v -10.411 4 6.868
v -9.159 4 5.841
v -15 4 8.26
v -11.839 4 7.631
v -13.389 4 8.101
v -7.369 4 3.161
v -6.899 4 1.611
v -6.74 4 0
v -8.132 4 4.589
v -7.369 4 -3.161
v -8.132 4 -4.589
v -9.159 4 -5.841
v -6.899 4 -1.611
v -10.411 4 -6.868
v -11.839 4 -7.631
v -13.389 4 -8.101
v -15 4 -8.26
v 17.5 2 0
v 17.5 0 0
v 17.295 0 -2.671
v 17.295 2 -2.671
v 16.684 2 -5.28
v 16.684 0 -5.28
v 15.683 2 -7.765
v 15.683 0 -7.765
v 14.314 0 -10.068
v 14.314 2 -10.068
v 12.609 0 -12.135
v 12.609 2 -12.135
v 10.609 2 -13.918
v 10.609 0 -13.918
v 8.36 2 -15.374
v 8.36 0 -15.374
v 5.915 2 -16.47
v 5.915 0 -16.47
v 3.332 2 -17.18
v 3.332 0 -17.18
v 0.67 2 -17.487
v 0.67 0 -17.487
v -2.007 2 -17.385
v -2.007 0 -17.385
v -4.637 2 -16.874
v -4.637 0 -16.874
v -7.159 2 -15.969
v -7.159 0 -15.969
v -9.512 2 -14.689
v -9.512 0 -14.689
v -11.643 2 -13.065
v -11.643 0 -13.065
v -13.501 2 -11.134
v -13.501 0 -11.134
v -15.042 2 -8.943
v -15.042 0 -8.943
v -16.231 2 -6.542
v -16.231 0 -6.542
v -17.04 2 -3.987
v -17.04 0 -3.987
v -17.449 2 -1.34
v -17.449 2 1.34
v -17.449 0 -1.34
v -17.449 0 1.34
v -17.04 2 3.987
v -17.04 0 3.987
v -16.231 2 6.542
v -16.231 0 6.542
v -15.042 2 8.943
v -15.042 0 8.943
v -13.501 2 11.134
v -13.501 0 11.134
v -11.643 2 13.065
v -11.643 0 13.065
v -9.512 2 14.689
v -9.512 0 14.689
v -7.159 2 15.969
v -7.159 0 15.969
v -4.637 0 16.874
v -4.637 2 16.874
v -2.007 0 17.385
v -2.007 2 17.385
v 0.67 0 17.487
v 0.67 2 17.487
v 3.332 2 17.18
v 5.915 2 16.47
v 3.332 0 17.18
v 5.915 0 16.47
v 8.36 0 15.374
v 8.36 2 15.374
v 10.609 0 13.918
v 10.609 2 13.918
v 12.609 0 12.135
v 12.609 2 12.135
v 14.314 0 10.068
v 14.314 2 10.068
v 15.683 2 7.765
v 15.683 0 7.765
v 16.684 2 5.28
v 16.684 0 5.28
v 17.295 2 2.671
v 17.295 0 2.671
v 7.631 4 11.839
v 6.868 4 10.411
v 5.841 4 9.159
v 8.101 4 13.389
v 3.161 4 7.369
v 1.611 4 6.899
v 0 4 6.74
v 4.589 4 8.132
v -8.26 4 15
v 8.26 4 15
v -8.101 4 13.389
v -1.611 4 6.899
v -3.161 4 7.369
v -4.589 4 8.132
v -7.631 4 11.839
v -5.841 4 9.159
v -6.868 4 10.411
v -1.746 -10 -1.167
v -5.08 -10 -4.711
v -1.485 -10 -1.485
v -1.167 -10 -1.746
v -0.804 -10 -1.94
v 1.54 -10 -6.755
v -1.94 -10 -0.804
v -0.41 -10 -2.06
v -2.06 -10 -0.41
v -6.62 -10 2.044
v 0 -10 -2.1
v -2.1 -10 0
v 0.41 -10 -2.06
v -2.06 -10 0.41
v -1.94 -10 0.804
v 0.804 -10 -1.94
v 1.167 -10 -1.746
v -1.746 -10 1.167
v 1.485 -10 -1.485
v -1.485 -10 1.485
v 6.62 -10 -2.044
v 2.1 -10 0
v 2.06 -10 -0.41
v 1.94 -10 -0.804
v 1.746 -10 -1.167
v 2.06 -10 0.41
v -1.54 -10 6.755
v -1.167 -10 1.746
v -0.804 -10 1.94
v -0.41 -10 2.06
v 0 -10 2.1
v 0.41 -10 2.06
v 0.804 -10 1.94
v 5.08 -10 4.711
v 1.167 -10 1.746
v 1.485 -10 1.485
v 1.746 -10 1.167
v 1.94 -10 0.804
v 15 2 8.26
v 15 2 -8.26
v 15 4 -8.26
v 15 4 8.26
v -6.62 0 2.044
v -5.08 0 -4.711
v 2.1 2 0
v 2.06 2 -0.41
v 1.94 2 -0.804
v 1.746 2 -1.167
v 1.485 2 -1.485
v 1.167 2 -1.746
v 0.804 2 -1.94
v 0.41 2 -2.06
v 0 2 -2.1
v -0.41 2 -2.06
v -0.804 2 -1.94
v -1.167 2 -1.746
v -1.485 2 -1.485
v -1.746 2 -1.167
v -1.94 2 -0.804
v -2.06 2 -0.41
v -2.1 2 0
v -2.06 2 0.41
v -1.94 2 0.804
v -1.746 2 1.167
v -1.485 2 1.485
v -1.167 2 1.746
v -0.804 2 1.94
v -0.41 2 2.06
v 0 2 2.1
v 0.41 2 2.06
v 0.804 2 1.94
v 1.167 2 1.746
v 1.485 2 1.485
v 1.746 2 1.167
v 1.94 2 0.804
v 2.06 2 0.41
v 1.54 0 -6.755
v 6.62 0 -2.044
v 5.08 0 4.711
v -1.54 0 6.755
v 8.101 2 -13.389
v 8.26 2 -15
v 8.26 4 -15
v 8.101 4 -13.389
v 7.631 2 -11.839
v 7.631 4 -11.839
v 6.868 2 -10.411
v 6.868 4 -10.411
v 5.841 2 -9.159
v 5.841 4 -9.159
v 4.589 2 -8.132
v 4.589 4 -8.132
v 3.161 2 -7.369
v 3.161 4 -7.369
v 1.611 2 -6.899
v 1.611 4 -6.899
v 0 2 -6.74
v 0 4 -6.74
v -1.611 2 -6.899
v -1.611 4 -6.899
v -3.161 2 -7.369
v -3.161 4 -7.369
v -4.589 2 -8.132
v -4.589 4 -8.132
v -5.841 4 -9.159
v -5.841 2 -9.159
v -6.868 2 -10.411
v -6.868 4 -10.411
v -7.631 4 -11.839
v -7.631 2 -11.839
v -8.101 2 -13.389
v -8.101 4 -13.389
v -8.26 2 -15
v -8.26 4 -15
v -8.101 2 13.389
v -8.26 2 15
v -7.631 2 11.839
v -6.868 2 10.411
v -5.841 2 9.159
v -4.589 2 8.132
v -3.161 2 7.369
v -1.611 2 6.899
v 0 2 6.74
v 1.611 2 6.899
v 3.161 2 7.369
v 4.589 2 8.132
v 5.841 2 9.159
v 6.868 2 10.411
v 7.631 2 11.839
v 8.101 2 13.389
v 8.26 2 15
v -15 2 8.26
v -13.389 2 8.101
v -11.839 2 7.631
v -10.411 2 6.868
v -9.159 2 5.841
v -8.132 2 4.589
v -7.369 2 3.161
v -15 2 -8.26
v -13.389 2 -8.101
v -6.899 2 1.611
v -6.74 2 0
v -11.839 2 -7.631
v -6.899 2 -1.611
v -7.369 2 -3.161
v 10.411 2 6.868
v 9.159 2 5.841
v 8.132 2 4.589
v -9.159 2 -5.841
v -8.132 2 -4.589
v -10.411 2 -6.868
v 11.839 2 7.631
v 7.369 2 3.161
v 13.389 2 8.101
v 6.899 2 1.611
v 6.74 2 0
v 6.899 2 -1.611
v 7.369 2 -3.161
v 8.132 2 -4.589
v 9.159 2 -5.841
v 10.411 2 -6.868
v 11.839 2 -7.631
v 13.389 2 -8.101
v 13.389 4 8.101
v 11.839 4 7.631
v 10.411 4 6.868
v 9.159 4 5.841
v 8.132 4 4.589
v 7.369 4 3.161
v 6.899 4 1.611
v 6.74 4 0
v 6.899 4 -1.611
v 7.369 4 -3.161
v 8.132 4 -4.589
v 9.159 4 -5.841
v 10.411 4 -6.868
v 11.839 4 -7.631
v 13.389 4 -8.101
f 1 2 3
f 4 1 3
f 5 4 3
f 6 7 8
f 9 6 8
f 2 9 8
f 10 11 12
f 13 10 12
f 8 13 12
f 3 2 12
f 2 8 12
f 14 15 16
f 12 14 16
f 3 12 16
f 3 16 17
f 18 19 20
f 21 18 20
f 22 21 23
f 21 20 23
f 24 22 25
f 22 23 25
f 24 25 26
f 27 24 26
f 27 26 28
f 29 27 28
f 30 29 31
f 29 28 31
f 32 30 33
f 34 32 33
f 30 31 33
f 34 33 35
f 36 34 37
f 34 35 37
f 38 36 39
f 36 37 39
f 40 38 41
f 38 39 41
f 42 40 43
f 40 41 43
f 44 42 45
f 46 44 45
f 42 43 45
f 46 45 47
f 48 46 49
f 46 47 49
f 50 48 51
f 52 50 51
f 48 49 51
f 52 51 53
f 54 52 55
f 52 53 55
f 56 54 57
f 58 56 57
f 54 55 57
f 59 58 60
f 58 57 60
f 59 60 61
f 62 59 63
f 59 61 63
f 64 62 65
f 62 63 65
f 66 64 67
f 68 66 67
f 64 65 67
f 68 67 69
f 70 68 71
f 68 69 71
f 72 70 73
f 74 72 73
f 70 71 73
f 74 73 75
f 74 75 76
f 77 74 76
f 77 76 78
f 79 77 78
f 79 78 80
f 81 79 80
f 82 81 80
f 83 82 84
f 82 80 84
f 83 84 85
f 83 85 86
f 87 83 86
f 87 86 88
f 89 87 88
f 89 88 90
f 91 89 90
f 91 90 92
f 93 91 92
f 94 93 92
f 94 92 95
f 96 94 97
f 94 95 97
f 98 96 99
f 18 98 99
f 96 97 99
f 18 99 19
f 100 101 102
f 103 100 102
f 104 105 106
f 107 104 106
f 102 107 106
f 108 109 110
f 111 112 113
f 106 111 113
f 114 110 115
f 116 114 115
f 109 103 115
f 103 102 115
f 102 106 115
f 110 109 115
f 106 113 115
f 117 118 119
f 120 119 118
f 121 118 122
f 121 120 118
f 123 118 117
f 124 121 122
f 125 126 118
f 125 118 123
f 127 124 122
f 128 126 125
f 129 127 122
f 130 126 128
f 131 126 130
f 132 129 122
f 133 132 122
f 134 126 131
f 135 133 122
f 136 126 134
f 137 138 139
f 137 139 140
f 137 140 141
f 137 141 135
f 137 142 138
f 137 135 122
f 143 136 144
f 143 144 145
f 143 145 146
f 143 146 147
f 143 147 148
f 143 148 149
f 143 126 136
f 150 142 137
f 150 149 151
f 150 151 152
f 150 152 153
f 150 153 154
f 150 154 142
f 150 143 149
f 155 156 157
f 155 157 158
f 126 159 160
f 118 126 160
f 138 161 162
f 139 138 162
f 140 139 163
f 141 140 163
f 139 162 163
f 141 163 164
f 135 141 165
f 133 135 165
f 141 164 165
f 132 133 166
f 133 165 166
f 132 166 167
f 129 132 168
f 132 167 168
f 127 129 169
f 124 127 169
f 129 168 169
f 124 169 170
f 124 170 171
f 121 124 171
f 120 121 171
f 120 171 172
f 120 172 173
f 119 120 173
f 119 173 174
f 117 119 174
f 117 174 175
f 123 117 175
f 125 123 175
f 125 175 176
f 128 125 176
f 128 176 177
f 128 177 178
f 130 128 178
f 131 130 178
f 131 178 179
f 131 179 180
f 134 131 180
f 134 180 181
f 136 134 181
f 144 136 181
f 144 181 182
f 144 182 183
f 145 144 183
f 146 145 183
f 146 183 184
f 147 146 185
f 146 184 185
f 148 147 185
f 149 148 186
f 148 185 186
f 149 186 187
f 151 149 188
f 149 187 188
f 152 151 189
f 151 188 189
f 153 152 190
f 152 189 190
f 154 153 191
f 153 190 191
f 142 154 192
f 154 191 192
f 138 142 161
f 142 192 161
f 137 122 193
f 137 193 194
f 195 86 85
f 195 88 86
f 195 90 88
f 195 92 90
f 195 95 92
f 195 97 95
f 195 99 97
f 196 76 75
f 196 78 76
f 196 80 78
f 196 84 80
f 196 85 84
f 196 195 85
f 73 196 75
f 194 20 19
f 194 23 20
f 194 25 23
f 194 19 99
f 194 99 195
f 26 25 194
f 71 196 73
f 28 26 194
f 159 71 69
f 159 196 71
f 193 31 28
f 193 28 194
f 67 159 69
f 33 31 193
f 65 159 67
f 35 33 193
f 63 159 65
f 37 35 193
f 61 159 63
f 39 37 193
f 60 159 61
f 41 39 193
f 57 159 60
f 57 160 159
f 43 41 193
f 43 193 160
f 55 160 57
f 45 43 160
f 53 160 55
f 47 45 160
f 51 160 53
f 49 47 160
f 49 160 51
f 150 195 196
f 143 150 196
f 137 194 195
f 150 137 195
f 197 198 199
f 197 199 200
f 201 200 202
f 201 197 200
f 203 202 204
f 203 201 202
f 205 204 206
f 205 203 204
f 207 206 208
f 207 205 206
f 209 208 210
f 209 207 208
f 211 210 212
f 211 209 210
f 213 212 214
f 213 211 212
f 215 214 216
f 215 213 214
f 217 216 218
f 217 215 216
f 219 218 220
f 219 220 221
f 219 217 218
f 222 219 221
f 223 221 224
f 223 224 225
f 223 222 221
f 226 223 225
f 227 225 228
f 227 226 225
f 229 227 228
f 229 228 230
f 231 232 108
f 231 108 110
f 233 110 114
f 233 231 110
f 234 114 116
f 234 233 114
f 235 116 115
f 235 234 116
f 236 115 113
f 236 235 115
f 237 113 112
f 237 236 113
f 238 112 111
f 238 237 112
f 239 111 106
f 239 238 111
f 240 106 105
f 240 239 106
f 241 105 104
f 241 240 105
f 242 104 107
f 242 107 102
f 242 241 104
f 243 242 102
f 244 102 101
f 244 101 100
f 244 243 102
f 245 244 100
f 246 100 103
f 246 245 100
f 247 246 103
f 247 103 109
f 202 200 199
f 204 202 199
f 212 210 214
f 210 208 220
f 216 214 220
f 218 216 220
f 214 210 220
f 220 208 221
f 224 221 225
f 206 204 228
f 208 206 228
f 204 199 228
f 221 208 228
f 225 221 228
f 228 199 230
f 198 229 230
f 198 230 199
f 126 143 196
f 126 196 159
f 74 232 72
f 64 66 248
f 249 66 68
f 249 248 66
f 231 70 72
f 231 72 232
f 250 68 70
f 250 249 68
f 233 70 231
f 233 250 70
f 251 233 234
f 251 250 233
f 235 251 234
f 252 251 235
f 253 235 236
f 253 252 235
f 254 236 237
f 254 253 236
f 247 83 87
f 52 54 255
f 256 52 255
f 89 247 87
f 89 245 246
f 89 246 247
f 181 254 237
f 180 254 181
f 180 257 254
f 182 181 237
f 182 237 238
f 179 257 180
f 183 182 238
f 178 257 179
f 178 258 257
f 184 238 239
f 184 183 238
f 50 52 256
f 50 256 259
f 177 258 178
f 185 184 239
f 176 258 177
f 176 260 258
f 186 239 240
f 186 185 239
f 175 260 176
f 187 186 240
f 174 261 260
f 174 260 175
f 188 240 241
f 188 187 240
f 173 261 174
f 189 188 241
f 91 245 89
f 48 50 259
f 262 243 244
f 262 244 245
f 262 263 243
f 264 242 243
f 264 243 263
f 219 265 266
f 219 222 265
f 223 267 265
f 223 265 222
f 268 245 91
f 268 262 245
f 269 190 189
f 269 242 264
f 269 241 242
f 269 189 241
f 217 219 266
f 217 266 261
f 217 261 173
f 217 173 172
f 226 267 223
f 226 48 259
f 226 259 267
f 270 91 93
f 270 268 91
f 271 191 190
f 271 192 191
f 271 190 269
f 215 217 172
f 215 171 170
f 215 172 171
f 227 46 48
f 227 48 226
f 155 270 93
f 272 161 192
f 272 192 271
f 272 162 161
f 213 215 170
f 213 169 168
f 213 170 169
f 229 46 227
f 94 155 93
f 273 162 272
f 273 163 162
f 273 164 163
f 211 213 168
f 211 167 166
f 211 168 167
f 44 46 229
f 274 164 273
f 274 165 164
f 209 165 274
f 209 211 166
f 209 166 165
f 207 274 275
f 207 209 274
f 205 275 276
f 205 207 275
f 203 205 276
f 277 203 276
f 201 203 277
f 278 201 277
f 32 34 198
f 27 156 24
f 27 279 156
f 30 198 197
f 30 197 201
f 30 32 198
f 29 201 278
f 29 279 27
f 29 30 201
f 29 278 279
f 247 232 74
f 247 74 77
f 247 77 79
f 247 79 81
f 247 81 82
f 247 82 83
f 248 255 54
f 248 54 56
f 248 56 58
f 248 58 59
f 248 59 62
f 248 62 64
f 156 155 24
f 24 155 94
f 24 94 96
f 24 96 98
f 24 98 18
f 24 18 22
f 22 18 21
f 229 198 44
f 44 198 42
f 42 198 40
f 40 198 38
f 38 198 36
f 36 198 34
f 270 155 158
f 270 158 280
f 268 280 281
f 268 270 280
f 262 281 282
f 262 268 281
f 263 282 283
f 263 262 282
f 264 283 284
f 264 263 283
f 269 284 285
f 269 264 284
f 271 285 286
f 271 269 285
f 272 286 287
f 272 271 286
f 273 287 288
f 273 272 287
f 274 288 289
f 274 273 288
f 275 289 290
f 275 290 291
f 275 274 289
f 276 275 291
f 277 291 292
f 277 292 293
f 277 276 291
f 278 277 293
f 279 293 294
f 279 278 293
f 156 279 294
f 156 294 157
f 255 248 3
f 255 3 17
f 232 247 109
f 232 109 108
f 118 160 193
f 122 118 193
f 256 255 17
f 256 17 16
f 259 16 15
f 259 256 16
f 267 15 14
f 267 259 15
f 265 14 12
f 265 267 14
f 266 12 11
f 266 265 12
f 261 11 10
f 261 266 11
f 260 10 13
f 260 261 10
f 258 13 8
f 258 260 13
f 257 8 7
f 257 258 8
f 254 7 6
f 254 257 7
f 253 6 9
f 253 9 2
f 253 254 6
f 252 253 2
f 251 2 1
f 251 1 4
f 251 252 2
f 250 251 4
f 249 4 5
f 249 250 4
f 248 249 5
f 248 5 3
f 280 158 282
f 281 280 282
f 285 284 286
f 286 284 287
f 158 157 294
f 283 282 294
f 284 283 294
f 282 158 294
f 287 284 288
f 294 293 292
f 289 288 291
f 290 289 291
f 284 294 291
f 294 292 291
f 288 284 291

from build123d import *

# Parameters (mm, degrees)
SKETCH4_R               = 17.5
BOSS_EXTRUDE1_DEPTH     = 2
BOSS_EXTRUDE2_DEPTH     = 4
BOSS_EXTRUDE3_DEPTH     = 10
SKETCH6_R               = 2.1
CUT_EXTRUDE1_DEPTH      = 3
CUT_EXTRUDE1_DEPTH_BACK = 13


with BuildPart() as part:
    # Sketch4 → Boss-Extrude1 (new body)
    with BuildSketch(Plane(origin=(0, 0, 0), x_dir=(1, 0, 0), z_dir=(0, 1, 0))):
        Circle(SKETCH4_R)
    extrude(amount=BOSS_EXTRUDE1_DEPTH)

    # Sketch1 → Boss-Extrude2 (add)
    with BuildSketch(Plane(origin=(0, 0, 0), x_dir=(1, 0, 0), z_dir=(0, 1, 0))):
        with BuildLine():
            Line((-8.26, 15), (8.26, 15))
            ThreePointArc((8.26, 15), (0, 6.74), (-8.26, 15))
        make_face()
        with BuildLine():
            Line((15, 8.26), (15, -8.26))
            ThreePointArc((15, -8.26), (6.74, 0), (15, 8.26))
        make_face()
        with BuildLine():
            Line((8.26, -15), (-8.26, -15))
            ThreePointArc((-8.26, -15), (0, -6.74), (8.26, -15))
        make_face()
        with BuildLine():
            Line((-15, -8.26), (-15, 8.26))
            ThreePointArc((-15, 8.26), (-6.74, 0), (-15, -8.26))
        make_face()
    extrude(amount=BOSS_EXTRUDE2_DEPTH)

    # Sketch5 → Boss-Extrude3 (add)
    with BuildSketch(Plane.XZ):
        Polygon((-6.619767116, 2.044182802), (-5.080197795, -4.710795089), (1.539569322, -6.754977891), (6.619767116, -2.044182802), (5.080197795, 4.710795089), (-1.539569322, 6.754977891), align=None)
    extrude(amount=BOSS_EXTRUDE3_DEPTH)

    # Sketch6 → Cut-Extrude1 (cut, two sides)
    with BuildSketch(Plane(origin=(0, 2, 0), x_dir=(1, 0, 0), z_dir=(0, 1, 0))) as cut_extrude1_sk:
        Circle(SKETCH6_R)
    extrude(amount=CUT_EXTRUDE1_DEPTH, mode=Mode.SUBTRACT)
    extrude(cut_extrude1_sk.sketch, amount=-CUT_EXTRUDE1_DEPTH_BACK, mode=Mode.SUBTRACT)


solid = part.part
